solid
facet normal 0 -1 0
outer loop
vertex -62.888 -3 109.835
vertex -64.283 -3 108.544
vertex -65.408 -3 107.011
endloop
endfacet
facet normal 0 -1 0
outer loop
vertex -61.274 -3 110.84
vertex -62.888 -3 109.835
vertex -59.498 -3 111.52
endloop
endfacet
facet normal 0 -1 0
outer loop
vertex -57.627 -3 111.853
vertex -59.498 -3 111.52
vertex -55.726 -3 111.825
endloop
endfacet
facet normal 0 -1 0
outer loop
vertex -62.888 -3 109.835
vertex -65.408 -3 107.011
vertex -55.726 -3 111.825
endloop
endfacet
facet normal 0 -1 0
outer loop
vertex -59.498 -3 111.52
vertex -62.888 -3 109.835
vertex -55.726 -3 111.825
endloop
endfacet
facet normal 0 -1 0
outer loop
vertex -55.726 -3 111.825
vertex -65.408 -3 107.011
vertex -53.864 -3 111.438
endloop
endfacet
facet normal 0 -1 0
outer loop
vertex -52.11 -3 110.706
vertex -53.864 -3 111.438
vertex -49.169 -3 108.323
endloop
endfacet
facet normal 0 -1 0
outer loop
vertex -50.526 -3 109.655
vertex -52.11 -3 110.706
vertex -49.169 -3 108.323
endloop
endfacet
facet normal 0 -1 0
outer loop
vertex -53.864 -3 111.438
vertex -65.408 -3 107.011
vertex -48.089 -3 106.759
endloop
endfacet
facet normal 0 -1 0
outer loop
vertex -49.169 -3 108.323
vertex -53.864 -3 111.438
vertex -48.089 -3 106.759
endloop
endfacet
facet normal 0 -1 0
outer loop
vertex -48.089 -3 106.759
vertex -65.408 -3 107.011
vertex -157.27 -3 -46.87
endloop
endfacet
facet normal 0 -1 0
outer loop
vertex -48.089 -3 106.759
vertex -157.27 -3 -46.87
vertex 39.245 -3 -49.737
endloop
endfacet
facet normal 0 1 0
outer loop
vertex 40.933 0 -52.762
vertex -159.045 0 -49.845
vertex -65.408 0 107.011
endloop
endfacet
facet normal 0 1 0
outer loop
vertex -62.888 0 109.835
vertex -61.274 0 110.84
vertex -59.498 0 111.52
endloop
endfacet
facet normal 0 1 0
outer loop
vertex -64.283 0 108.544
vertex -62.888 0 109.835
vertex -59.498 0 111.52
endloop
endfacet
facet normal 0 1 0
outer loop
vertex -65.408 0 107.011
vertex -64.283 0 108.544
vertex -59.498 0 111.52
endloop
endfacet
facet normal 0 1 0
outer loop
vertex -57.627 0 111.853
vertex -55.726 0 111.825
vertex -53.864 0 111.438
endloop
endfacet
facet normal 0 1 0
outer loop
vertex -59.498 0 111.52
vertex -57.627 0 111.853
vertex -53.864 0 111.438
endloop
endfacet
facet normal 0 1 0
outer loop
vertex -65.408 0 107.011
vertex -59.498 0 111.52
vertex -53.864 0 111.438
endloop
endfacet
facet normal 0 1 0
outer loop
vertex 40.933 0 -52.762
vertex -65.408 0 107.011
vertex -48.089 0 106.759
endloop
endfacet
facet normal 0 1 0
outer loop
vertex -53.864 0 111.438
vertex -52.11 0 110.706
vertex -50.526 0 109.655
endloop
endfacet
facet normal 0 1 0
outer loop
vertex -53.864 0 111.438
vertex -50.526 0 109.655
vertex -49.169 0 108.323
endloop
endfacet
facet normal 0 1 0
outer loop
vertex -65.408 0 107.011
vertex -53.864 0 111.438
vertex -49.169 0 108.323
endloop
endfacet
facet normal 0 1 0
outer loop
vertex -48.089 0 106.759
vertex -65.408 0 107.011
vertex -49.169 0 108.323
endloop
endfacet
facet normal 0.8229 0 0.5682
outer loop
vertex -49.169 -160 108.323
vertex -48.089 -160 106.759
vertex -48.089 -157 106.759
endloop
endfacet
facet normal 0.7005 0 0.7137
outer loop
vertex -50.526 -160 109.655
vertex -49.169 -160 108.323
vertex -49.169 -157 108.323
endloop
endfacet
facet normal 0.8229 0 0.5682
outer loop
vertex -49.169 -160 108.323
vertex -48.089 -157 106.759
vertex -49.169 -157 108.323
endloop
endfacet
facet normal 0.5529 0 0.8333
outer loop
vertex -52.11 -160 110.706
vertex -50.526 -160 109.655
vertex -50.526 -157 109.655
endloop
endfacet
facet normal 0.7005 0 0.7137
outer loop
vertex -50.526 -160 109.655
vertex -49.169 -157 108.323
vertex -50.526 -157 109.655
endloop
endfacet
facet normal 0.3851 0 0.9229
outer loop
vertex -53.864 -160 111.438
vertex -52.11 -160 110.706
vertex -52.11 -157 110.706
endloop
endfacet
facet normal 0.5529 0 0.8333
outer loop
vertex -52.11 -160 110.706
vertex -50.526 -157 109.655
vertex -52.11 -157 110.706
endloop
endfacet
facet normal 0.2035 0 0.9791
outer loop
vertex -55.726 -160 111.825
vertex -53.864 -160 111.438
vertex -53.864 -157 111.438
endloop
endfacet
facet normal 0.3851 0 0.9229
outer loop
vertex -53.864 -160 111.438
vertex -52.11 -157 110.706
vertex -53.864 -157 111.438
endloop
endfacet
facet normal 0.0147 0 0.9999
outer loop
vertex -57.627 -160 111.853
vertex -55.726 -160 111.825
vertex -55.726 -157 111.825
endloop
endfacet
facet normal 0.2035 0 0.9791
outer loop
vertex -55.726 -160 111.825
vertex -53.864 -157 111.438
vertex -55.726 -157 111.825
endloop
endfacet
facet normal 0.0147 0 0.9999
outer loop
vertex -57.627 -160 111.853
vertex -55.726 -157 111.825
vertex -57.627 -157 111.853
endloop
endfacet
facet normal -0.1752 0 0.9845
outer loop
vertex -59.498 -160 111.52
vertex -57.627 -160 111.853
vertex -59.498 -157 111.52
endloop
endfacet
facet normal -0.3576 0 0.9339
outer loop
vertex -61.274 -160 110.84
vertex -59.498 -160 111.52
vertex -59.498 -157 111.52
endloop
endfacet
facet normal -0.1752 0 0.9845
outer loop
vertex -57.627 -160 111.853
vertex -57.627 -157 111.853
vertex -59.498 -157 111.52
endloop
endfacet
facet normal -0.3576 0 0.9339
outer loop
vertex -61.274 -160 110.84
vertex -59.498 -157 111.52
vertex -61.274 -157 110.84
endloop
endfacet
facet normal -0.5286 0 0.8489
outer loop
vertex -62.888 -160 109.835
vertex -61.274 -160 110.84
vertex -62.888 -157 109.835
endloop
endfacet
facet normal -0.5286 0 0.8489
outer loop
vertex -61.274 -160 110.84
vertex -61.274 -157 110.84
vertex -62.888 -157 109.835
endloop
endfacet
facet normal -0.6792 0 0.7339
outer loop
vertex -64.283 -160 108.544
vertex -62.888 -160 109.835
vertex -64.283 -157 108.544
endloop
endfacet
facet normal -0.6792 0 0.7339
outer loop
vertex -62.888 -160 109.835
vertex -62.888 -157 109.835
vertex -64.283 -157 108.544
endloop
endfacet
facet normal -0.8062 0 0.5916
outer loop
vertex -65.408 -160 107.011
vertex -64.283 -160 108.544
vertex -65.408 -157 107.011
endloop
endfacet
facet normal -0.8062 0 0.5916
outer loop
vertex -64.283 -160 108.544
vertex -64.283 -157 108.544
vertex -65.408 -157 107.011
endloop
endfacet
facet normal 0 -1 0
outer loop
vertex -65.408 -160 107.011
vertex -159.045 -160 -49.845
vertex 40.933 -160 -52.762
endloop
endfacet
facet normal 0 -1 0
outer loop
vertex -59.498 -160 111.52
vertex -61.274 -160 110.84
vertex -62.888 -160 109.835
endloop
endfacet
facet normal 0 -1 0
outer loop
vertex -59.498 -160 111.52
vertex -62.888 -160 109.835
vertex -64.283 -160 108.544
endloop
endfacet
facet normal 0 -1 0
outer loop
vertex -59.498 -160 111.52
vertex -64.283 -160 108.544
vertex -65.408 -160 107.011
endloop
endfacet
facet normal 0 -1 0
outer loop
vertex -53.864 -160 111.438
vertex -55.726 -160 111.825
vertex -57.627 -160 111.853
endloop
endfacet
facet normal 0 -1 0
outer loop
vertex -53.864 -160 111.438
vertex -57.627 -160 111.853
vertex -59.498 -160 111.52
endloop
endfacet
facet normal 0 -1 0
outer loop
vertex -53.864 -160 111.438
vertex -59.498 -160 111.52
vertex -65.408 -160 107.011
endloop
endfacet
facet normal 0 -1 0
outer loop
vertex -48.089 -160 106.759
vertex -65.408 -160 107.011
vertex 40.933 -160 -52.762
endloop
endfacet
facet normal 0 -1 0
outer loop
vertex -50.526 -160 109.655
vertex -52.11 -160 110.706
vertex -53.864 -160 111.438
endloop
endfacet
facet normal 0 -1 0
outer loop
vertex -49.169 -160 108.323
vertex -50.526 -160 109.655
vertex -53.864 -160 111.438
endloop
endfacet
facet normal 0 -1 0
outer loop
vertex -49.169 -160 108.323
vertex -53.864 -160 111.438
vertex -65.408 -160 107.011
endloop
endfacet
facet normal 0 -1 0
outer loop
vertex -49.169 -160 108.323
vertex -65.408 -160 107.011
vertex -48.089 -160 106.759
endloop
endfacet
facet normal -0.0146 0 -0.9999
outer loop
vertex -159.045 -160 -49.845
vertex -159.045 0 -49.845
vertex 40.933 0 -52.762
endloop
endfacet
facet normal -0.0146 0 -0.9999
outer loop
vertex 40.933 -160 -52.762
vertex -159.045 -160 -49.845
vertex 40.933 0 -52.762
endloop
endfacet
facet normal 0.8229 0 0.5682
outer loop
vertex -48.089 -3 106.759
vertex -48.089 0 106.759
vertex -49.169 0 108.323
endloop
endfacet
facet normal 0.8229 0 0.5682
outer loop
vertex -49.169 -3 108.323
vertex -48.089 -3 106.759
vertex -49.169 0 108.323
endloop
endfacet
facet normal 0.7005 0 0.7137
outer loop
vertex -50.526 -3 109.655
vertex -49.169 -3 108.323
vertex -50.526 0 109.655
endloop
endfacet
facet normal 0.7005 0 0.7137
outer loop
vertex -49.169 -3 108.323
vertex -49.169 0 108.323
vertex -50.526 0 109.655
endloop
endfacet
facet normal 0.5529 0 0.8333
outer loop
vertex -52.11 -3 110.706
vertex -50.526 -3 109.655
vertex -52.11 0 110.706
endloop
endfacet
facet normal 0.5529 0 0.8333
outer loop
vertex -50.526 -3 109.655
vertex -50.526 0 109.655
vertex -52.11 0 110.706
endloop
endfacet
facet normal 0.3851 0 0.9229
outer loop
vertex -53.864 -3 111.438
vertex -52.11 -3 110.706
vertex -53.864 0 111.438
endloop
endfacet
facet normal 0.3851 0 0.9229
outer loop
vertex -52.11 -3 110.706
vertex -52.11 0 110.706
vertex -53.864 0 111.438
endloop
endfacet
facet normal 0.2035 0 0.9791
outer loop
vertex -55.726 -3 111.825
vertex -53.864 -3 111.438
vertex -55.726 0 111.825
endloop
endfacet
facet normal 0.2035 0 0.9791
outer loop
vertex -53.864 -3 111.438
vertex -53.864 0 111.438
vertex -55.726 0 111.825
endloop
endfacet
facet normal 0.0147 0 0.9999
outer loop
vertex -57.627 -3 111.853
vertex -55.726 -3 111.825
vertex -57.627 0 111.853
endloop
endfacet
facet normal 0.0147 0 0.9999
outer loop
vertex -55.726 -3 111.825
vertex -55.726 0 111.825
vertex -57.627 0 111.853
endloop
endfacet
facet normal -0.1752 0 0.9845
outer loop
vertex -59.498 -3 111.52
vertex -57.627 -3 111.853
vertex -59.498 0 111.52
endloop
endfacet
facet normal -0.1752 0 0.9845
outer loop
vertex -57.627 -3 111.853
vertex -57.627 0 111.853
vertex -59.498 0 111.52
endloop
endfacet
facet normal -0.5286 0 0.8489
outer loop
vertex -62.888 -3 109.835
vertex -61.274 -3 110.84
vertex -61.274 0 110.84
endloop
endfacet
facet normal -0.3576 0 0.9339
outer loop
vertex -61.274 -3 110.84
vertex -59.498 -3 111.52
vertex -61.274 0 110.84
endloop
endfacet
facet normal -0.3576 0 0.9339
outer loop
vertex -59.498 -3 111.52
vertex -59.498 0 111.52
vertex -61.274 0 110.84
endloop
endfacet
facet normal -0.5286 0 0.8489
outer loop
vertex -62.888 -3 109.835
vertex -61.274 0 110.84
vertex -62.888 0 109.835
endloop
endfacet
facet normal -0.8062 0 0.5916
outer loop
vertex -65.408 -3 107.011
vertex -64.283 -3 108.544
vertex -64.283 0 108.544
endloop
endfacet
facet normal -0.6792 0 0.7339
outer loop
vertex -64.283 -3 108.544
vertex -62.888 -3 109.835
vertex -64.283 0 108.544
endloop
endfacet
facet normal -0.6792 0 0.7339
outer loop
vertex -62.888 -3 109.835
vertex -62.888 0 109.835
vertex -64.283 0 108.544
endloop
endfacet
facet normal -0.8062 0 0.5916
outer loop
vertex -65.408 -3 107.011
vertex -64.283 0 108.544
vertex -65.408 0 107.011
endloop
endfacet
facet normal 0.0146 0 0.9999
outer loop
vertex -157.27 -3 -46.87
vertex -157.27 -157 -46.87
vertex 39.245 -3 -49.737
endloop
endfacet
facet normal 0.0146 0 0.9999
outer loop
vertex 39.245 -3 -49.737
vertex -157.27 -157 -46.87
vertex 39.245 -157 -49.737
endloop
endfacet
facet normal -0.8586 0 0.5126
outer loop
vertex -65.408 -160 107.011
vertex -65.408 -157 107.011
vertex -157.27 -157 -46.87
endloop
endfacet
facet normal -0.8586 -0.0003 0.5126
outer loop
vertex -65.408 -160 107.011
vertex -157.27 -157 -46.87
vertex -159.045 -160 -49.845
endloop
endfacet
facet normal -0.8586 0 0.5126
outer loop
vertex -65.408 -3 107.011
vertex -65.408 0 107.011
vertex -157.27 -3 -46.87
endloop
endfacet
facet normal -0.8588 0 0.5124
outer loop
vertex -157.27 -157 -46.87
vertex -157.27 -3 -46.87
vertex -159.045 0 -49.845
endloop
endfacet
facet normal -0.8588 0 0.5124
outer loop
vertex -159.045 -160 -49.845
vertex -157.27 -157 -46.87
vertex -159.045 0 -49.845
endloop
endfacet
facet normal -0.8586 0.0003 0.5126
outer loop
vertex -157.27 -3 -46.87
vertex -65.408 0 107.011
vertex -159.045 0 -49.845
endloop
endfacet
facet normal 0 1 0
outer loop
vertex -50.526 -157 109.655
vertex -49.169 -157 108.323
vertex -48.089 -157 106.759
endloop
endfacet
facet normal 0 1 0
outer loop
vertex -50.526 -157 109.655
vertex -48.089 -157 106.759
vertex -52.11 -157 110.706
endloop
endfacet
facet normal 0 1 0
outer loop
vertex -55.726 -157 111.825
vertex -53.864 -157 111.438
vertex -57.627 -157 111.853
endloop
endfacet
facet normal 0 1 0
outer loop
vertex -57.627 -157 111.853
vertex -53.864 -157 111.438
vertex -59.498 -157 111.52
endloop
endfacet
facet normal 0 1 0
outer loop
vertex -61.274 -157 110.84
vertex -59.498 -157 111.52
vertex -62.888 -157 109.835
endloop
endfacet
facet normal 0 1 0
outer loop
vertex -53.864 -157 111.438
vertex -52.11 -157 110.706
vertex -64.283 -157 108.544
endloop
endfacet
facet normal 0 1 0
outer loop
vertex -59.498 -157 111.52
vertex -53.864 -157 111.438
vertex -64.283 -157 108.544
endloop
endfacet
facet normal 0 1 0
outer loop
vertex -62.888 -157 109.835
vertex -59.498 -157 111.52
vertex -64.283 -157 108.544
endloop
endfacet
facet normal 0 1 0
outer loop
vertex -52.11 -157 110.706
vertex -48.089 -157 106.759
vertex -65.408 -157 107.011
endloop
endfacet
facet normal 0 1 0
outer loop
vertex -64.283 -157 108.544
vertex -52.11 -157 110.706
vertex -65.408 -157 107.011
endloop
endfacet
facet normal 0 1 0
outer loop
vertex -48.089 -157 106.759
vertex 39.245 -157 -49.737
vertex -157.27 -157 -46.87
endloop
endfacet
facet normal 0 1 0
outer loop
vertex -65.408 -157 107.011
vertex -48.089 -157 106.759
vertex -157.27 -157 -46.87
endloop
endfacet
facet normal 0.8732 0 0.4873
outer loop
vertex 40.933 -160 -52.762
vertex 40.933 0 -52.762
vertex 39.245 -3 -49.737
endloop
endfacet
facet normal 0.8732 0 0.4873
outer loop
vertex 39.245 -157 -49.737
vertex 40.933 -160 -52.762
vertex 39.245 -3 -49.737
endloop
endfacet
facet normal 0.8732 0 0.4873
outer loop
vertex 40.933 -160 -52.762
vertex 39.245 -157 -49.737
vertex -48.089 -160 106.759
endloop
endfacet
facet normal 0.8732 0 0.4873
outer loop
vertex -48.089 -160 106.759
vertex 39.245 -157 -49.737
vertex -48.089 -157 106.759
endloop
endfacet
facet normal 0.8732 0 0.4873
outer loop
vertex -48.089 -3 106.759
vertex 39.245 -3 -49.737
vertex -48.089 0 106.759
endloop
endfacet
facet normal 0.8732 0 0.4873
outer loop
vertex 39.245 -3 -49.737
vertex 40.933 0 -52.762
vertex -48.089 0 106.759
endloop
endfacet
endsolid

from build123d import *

# Parameters (mm, degrees)
F1_DEPTH = 160
F4_DEPTH = 184


with BuildPart() as f1:
    # F0 (on Front) → F1 (new body)
    with BuildSketch(Plane.XZ):
        with BuildLine():
            Line((40.9332527794, -52.7619718481), (-48.0891487754, 106.7585873007))
            ThreePointArc((-48.0891487754, 106.7585873007), (-56.6755499732, 111.8843764566), (-65.4078141956, 107.0112294702))
            Line((-65.4078141956, 107.0112294702), (-159.0454700669, -49.8447113565))
            Line((-159.0454700669, -49.8447113565), (40.9332527794, -52.7619718481))
        make_face()
    extrude(amount=F1_DEPTH)

    # F3 (on offset) → F4 (cut)
    with BuildSketch(Plane(origin=(-0.7170523297, 0, -49.1540640703), x_dir=(0.9998936142, 0, -0.0145863025), z_dir=(-0.0145863025, 0, -0.9998936142))):
        Polygon((-161.2010151148, 3), (-155.3014998566, 3), (38.6985001434, 3), (52.8733432293, 3), (52.8733432293, 157), (38.6985001434, 157), (-155.3014998566, 157), (-161.2010151148, 157), align=None)
    extrude(amount=-F4_DEPTH, mode=Mode.SUBTRACT)


solid = f1.part
